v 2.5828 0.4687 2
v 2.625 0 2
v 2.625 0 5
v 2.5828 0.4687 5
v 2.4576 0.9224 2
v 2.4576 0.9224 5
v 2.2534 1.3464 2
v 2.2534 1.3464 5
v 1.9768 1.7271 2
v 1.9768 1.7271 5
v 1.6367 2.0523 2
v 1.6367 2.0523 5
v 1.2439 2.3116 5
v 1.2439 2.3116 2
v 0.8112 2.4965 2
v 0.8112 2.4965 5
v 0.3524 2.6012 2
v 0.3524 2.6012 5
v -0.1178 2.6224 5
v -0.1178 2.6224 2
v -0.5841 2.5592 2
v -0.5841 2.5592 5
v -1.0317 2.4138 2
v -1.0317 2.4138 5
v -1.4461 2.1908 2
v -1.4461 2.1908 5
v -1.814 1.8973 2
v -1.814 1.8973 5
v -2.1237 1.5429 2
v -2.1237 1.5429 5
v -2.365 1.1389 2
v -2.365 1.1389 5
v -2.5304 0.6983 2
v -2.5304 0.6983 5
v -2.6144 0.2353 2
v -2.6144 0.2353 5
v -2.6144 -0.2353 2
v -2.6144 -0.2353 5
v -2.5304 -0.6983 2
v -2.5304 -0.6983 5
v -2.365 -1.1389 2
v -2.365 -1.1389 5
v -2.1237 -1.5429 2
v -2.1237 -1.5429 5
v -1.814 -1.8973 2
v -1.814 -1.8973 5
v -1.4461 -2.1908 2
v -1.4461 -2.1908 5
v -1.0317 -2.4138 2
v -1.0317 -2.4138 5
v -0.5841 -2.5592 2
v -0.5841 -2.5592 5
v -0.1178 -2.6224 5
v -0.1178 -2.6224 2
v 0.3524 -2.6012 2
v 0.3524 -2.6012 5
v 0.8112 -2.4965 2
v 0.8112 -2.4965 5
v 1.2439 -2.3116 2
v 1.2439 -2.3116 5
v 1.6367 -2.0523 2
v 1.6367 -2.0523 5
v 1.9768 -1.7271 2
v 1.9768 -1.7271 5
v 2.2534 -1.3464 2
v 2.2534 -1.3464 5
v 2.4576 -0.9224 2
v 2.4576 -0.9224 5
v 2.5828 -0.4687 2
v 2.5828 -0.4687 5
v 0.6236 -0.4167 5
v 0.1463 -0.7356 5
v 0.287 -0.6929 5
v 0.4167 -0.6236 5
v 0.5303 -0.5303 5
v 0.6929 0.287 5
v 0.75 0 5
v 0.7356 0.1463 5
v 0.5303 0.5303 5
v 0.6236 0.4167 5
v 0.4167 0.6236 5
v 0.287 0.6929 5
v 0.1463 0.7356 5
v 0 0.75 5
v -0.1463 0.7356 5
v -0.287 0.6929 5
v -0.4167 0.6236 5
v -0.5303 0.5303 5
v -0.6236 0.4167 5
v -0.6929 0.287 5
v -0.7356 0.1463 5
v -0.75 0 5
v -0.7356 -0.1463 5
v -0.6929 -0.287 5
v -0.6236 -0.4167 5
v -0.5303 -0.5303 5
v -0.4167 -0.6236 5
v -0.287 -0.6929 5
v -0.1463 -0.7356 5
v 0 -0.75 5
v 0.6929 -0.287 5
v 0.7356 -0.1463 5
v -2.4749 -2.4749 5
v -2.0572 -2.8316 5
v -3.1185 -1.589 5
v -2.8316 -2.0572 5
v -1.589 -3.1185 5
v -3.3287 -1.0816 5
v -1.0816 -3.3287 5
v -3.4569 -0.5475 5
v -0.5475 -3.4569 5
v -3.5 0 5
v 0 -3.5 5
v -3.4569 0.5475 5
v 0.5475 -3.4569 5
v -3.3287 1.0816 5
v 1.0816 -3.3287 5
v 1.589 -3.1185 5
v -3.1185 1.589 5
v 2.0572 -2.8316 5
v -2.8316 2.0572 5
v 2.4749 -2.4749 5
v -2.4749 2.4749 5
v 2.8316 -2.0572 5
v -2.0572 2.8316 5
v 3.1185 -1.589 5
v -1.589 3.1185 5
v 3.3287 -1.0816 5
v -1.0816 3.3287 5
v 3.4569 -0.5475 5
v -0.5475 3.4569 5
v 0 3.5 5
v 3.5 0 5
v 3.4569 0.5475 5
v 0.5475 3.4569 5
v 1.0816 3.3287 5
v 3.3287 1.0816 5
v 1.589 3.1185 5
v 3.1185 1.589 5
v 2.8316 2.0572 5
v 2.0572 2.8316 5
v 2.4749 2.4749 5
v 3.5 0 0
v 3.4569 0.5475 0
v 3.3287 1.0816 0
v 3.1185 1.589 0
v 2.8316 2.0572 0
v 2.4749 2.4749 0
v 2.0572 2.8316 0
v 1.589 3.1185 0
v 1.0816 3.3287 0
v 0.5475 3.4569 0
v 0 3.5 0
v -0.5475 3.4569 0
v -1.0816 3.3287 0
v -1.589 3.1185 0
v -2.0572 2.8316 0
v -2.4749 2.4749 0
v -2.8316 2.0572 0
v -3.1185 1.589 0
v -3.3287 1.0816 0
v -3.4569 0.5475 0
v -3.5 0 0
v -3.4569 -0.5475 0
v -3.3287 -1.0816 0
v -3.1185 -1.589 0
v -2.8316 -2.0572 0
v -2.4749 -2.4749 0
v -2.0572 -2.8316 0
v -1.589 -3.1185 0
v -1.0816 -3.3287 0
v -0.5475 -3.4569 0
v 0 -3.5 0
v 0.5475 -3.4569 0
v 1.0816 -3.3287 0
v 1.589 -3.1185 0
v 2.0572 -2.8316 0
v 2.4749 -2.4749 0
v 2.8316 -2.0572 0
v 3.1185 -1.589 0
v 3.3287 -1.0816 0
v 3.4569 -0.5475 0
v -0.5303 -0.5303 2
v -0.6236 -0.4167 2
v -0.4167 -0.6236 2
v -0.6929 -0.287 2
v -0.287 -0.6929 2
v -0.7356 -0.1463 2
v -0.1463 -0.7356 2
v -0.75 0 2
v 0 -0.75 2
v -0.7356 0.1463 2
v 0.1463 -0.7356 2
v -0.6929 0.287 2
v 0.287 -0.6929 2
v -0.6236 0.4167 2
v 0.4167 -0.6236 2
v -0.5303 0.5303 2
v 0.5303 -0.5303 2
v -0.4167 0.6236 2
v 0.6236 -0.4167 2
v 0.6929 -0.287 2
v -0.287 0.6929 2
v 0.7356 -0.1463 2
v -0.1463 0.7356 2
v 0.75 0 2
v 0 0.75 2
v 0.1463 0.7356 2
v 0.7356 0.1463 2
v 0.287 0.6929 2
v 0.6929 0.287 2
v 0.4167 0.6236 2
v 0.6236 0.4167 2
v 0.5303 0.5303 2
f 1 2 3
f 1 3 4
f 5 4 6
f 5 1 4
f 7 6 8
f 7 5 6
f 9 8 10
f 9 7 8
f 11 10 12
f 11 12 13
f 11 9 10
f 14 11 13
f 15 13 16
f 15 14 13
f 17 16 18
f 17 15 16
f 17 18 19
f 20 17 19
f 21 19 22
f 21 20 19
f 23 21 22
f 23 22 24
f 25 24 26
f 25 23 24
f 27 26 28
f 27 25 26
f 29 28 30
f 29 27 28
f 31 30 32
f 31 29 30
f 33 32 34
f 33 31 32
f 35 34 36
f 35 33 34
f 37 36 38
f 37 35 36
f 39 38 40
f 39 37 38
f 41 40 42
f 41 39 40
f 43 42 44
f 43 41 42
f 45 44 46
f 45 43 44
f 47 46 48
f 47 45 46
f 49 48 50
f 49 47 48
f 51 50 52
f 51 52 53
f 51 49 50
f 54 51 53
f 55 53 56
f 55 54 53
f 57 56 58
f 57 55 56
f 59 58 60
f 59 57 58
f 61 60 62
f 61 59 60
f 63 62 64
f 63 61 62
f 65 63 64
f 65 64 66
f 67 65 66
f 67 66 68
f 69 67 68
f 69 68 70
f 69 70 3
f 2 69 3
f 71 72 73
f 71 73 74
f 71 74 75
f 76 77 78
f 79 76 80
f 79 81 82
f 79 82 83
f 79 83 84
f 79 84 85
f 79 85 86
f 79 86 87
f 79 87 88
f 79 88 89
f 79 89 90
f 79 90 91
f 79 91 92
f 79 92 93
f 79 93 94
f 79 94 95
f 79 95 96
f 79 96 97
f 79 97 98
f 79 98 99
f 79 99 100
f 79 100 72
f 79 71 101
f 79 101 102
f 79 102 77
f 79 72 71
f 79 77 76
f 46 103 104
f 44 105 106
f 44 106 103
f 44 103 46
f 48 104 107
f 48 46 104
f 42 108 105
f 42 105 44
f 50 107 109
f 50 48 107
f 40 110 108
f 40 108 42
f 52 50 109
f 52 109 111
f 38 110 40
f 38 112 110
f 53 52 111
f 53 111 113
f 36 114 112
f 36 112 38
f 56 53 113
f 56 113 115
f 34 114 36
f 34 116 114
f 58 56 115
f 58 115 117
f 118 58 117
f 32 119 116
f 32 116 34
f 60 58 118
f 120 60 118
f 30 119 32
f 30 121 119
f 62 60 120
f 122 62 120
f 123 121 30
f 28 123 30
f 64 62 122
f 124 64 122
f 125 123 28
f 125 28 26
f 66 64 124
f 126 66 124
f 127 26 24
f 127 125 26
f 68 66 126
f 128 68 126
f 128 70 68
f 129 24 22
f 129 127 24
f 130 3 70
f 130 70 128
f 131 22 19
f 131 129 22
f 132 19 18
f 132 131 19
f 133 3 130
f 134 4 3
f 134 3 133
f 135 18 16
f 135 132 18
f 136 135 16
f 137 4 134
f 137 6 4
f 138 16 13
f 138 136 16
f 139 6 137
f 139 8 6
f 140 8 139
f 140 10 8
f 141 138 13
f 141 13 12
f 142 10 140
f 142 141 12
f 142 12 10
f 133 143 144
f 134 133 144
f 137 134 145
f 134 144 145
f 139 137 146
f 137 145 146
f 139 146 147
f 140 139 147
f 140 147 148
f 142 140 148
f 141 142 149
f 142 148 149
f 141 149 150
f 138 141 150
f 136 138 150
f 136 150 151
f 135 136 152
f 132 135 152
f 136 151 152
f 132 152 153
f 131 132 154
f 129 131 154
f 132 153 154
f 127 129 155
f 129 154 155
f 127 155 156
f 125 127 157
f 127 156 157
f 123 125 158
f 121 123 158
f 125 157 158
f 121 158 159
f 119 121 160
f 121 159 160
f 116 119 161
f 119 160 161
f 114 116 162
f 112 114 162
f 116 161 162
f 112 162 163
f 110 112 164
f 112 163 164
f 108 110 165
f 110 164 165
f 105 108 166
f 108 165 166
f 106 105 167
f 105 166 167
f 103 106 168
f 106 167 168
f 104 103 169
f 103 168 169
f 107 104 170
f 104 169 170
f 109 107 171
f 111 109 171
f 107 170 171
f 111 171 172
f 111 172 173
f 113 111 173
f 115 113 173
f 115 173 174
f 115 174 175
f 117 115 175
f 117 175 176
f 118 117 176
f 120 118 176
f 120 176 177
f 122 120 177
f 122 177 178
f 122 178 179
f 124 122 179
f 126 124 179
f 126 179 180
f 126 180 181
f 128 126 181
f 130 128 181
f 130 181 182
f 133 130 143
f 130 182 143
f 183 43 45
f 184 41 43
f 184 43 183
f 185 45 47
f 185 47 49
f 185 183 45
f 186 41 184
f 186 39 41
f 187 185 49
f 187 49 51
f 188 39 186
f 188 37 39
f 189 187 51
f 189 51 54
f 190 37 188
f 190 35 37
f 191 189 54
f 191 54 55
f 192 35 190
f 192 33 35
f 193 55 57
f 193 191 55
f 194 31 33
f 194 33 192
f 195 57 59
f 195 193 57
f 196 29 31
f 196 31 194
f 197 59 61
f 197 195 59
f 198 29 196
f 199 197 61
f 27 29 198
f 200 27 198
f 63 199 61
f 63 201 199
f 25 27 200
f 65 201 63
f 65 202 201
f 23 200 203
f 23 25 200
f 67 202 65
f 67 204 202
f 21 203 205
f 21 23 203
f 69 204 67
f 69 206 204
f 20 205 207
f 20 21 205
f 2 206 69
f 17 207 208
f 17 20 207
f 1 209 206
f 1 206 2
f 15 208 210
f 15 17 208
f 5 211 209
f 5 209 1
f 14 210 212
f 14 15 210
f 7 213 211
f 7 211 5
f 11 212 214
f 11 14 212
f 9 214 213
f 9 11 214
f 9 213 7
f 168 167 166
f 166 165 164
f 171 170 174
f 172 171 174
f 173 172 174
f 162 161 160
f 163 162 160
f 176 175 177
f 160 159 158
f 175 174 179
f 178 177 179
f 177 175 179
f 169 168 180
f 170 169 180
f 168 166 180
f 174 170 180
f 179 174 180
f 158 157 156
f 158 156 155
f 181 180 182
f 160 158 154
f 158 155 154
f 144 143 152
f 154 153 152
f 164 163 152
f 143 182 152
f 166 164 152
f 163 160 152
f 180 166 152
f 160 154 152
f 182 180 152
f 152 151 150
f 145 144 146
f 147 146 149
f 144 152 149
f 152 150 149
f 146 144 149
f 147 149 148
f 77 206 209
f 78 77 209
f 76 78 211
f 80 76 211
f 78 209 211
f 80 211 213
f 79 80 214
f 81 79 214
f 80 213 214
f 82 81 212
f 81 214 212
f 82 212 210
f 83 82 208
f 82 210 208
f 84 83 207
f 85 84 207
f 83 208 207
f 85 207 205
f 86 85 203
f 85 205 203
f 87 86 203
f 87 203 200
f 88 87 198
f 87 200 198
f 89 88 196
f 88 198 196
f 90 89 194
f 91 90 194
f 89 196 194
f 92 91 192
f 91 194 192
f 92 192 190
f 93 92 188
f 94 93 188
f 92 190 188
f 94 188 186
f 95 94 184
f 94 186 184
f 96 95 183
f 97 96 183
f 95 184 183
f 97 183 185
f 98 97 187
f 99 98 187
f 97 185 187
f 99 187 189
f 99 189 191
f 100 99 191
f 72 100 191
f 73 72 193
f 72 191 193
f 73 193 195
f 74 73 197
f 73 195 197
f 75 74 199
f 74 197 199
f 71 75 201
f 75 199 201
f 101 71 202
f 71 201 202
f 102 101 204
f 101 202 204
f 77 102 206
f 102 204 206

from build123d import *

# Parameters (mm, degrees)
F0_R     = 3.5
F1_DEPTH = 5
F3_START = 2
F2_R     = 2.625
F2_R_2   = 0.75
F3_DEPTH = 3


with BuildPart() as f1:
    # F0 (on Top) → F1 (new body)
    with BuildSketch(Plane.XY):
        Circle(F0_R)
    extrude(amount=F1_DEPTH)

    # F2 (on Top) → F3 (cut)
    with BuildSketch(Plane.XY.offset(F3_START)):
        Circle(F2_R)
        Circle(F2_R_2, mode=Mode.SUBTRACT)
    extrude(amount=F3_DEPTH, mode=Mode.SUBTRACT)


solid = f1.part
